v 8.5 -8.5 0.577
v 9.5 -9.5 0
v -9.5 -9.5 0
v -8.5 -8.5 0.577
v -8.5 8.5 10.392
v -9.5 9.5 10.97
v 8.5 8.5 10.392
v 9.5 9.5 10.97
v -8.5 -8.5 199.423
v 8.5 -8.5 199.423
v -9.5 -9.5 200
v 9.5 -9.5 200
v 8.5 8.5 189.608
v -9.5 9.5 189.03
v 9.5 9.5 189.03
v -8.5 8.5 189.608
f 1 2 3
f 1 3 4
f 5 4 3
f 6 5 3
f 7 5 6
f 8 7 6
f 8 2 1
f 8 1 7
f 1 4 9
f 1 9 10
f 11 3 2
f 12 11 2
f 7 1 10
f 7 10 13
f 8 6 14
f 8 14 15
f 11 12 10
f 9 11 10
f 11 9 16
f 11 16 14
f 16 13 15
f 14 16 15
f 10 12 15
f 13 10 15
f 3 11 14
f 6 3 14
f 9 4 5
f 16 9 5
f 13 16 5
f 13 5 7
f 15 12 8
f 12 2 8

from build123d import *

# Parameters (mm, degrees)
SKETCH1_W               = 19
SKETCH1_H               = 19
SKETCH1_W_2             = 17
SKETCH1_H_2             = 17
BOSS_EXTRUDE1_DEPTH     = 200
CUT_EXTRUDE1_DEPTH      = 1
CUT_EXTRUDE1_DEPTH_BACK = 20
CUT_EXTRUDE2_DEPTH      = 1
CUT_EXTRUDE2_DEPTH_BACK = 20


with BuildPart() as part:
    # Sketch1 → Boss-Extrude1 (new body)
    with BuildSketch(Plane.XY):
        Rectangle(SKETCH1_W, SKETCH1_H)
        Rectangle(SKETCH1_W_2, SKETCH1_H_2, mode=Mode.SUBTRACT)
    extrude(amount=BOSS_EXTRUDE1_DEPTH)

    # Sketch2 → Cut-Extrude1 (cut, two sides)
    with BuildSketch(Plane(origin=(9.5, 0, 0), x_dir=(0, 0, -1), z_dir=(1, 0, 0))) as cut_extrude1_sk:
        Polygon((-405.900472872, -366.130080316), (-200, -9.5), (-189.030344885, 9.5), (16.870127986, 366.130080316), (-696.390032646, 777.931026059), (-1119.160633503, 45.670865427), align=None)
    extrude(amount=CUT_EXTRUDE1_DEPTH, mode=Mode.SUBTRACT)
    extrude(cut_extrude1_sk.sketch, amount=-CUT_EXTRUDE1_DEPTH_BACK, mode=Mode.SUBTRACT)

    # Sketch3 → Cut-Extrude2 (cut, two sides)
    with BuildSketch(Plane(origin=(9.5, 0, 0), x_dir=(0, 0, -1), z_dir=(1, 0, 0))) as cut_extrude2_sk:
        Polygon((205.900472872, -366.130080316), (0, -9.5), (-10.969655115, 9.5), (-216.870127986, 366.130080316), (496.390032646, 777.931026059), (919.160633503, 45.670865427), align=None)
    extrude(amount=CUT_EXTRUDE2_DEPTH, mode=Mode.SUBTRACT)
    extrude(cut_extrude2_sk.sketch, amount=-CUT_EXTRUDE2_DEPTH_BACK, mode=Mode.SUBTRACT)


solid = part.part
